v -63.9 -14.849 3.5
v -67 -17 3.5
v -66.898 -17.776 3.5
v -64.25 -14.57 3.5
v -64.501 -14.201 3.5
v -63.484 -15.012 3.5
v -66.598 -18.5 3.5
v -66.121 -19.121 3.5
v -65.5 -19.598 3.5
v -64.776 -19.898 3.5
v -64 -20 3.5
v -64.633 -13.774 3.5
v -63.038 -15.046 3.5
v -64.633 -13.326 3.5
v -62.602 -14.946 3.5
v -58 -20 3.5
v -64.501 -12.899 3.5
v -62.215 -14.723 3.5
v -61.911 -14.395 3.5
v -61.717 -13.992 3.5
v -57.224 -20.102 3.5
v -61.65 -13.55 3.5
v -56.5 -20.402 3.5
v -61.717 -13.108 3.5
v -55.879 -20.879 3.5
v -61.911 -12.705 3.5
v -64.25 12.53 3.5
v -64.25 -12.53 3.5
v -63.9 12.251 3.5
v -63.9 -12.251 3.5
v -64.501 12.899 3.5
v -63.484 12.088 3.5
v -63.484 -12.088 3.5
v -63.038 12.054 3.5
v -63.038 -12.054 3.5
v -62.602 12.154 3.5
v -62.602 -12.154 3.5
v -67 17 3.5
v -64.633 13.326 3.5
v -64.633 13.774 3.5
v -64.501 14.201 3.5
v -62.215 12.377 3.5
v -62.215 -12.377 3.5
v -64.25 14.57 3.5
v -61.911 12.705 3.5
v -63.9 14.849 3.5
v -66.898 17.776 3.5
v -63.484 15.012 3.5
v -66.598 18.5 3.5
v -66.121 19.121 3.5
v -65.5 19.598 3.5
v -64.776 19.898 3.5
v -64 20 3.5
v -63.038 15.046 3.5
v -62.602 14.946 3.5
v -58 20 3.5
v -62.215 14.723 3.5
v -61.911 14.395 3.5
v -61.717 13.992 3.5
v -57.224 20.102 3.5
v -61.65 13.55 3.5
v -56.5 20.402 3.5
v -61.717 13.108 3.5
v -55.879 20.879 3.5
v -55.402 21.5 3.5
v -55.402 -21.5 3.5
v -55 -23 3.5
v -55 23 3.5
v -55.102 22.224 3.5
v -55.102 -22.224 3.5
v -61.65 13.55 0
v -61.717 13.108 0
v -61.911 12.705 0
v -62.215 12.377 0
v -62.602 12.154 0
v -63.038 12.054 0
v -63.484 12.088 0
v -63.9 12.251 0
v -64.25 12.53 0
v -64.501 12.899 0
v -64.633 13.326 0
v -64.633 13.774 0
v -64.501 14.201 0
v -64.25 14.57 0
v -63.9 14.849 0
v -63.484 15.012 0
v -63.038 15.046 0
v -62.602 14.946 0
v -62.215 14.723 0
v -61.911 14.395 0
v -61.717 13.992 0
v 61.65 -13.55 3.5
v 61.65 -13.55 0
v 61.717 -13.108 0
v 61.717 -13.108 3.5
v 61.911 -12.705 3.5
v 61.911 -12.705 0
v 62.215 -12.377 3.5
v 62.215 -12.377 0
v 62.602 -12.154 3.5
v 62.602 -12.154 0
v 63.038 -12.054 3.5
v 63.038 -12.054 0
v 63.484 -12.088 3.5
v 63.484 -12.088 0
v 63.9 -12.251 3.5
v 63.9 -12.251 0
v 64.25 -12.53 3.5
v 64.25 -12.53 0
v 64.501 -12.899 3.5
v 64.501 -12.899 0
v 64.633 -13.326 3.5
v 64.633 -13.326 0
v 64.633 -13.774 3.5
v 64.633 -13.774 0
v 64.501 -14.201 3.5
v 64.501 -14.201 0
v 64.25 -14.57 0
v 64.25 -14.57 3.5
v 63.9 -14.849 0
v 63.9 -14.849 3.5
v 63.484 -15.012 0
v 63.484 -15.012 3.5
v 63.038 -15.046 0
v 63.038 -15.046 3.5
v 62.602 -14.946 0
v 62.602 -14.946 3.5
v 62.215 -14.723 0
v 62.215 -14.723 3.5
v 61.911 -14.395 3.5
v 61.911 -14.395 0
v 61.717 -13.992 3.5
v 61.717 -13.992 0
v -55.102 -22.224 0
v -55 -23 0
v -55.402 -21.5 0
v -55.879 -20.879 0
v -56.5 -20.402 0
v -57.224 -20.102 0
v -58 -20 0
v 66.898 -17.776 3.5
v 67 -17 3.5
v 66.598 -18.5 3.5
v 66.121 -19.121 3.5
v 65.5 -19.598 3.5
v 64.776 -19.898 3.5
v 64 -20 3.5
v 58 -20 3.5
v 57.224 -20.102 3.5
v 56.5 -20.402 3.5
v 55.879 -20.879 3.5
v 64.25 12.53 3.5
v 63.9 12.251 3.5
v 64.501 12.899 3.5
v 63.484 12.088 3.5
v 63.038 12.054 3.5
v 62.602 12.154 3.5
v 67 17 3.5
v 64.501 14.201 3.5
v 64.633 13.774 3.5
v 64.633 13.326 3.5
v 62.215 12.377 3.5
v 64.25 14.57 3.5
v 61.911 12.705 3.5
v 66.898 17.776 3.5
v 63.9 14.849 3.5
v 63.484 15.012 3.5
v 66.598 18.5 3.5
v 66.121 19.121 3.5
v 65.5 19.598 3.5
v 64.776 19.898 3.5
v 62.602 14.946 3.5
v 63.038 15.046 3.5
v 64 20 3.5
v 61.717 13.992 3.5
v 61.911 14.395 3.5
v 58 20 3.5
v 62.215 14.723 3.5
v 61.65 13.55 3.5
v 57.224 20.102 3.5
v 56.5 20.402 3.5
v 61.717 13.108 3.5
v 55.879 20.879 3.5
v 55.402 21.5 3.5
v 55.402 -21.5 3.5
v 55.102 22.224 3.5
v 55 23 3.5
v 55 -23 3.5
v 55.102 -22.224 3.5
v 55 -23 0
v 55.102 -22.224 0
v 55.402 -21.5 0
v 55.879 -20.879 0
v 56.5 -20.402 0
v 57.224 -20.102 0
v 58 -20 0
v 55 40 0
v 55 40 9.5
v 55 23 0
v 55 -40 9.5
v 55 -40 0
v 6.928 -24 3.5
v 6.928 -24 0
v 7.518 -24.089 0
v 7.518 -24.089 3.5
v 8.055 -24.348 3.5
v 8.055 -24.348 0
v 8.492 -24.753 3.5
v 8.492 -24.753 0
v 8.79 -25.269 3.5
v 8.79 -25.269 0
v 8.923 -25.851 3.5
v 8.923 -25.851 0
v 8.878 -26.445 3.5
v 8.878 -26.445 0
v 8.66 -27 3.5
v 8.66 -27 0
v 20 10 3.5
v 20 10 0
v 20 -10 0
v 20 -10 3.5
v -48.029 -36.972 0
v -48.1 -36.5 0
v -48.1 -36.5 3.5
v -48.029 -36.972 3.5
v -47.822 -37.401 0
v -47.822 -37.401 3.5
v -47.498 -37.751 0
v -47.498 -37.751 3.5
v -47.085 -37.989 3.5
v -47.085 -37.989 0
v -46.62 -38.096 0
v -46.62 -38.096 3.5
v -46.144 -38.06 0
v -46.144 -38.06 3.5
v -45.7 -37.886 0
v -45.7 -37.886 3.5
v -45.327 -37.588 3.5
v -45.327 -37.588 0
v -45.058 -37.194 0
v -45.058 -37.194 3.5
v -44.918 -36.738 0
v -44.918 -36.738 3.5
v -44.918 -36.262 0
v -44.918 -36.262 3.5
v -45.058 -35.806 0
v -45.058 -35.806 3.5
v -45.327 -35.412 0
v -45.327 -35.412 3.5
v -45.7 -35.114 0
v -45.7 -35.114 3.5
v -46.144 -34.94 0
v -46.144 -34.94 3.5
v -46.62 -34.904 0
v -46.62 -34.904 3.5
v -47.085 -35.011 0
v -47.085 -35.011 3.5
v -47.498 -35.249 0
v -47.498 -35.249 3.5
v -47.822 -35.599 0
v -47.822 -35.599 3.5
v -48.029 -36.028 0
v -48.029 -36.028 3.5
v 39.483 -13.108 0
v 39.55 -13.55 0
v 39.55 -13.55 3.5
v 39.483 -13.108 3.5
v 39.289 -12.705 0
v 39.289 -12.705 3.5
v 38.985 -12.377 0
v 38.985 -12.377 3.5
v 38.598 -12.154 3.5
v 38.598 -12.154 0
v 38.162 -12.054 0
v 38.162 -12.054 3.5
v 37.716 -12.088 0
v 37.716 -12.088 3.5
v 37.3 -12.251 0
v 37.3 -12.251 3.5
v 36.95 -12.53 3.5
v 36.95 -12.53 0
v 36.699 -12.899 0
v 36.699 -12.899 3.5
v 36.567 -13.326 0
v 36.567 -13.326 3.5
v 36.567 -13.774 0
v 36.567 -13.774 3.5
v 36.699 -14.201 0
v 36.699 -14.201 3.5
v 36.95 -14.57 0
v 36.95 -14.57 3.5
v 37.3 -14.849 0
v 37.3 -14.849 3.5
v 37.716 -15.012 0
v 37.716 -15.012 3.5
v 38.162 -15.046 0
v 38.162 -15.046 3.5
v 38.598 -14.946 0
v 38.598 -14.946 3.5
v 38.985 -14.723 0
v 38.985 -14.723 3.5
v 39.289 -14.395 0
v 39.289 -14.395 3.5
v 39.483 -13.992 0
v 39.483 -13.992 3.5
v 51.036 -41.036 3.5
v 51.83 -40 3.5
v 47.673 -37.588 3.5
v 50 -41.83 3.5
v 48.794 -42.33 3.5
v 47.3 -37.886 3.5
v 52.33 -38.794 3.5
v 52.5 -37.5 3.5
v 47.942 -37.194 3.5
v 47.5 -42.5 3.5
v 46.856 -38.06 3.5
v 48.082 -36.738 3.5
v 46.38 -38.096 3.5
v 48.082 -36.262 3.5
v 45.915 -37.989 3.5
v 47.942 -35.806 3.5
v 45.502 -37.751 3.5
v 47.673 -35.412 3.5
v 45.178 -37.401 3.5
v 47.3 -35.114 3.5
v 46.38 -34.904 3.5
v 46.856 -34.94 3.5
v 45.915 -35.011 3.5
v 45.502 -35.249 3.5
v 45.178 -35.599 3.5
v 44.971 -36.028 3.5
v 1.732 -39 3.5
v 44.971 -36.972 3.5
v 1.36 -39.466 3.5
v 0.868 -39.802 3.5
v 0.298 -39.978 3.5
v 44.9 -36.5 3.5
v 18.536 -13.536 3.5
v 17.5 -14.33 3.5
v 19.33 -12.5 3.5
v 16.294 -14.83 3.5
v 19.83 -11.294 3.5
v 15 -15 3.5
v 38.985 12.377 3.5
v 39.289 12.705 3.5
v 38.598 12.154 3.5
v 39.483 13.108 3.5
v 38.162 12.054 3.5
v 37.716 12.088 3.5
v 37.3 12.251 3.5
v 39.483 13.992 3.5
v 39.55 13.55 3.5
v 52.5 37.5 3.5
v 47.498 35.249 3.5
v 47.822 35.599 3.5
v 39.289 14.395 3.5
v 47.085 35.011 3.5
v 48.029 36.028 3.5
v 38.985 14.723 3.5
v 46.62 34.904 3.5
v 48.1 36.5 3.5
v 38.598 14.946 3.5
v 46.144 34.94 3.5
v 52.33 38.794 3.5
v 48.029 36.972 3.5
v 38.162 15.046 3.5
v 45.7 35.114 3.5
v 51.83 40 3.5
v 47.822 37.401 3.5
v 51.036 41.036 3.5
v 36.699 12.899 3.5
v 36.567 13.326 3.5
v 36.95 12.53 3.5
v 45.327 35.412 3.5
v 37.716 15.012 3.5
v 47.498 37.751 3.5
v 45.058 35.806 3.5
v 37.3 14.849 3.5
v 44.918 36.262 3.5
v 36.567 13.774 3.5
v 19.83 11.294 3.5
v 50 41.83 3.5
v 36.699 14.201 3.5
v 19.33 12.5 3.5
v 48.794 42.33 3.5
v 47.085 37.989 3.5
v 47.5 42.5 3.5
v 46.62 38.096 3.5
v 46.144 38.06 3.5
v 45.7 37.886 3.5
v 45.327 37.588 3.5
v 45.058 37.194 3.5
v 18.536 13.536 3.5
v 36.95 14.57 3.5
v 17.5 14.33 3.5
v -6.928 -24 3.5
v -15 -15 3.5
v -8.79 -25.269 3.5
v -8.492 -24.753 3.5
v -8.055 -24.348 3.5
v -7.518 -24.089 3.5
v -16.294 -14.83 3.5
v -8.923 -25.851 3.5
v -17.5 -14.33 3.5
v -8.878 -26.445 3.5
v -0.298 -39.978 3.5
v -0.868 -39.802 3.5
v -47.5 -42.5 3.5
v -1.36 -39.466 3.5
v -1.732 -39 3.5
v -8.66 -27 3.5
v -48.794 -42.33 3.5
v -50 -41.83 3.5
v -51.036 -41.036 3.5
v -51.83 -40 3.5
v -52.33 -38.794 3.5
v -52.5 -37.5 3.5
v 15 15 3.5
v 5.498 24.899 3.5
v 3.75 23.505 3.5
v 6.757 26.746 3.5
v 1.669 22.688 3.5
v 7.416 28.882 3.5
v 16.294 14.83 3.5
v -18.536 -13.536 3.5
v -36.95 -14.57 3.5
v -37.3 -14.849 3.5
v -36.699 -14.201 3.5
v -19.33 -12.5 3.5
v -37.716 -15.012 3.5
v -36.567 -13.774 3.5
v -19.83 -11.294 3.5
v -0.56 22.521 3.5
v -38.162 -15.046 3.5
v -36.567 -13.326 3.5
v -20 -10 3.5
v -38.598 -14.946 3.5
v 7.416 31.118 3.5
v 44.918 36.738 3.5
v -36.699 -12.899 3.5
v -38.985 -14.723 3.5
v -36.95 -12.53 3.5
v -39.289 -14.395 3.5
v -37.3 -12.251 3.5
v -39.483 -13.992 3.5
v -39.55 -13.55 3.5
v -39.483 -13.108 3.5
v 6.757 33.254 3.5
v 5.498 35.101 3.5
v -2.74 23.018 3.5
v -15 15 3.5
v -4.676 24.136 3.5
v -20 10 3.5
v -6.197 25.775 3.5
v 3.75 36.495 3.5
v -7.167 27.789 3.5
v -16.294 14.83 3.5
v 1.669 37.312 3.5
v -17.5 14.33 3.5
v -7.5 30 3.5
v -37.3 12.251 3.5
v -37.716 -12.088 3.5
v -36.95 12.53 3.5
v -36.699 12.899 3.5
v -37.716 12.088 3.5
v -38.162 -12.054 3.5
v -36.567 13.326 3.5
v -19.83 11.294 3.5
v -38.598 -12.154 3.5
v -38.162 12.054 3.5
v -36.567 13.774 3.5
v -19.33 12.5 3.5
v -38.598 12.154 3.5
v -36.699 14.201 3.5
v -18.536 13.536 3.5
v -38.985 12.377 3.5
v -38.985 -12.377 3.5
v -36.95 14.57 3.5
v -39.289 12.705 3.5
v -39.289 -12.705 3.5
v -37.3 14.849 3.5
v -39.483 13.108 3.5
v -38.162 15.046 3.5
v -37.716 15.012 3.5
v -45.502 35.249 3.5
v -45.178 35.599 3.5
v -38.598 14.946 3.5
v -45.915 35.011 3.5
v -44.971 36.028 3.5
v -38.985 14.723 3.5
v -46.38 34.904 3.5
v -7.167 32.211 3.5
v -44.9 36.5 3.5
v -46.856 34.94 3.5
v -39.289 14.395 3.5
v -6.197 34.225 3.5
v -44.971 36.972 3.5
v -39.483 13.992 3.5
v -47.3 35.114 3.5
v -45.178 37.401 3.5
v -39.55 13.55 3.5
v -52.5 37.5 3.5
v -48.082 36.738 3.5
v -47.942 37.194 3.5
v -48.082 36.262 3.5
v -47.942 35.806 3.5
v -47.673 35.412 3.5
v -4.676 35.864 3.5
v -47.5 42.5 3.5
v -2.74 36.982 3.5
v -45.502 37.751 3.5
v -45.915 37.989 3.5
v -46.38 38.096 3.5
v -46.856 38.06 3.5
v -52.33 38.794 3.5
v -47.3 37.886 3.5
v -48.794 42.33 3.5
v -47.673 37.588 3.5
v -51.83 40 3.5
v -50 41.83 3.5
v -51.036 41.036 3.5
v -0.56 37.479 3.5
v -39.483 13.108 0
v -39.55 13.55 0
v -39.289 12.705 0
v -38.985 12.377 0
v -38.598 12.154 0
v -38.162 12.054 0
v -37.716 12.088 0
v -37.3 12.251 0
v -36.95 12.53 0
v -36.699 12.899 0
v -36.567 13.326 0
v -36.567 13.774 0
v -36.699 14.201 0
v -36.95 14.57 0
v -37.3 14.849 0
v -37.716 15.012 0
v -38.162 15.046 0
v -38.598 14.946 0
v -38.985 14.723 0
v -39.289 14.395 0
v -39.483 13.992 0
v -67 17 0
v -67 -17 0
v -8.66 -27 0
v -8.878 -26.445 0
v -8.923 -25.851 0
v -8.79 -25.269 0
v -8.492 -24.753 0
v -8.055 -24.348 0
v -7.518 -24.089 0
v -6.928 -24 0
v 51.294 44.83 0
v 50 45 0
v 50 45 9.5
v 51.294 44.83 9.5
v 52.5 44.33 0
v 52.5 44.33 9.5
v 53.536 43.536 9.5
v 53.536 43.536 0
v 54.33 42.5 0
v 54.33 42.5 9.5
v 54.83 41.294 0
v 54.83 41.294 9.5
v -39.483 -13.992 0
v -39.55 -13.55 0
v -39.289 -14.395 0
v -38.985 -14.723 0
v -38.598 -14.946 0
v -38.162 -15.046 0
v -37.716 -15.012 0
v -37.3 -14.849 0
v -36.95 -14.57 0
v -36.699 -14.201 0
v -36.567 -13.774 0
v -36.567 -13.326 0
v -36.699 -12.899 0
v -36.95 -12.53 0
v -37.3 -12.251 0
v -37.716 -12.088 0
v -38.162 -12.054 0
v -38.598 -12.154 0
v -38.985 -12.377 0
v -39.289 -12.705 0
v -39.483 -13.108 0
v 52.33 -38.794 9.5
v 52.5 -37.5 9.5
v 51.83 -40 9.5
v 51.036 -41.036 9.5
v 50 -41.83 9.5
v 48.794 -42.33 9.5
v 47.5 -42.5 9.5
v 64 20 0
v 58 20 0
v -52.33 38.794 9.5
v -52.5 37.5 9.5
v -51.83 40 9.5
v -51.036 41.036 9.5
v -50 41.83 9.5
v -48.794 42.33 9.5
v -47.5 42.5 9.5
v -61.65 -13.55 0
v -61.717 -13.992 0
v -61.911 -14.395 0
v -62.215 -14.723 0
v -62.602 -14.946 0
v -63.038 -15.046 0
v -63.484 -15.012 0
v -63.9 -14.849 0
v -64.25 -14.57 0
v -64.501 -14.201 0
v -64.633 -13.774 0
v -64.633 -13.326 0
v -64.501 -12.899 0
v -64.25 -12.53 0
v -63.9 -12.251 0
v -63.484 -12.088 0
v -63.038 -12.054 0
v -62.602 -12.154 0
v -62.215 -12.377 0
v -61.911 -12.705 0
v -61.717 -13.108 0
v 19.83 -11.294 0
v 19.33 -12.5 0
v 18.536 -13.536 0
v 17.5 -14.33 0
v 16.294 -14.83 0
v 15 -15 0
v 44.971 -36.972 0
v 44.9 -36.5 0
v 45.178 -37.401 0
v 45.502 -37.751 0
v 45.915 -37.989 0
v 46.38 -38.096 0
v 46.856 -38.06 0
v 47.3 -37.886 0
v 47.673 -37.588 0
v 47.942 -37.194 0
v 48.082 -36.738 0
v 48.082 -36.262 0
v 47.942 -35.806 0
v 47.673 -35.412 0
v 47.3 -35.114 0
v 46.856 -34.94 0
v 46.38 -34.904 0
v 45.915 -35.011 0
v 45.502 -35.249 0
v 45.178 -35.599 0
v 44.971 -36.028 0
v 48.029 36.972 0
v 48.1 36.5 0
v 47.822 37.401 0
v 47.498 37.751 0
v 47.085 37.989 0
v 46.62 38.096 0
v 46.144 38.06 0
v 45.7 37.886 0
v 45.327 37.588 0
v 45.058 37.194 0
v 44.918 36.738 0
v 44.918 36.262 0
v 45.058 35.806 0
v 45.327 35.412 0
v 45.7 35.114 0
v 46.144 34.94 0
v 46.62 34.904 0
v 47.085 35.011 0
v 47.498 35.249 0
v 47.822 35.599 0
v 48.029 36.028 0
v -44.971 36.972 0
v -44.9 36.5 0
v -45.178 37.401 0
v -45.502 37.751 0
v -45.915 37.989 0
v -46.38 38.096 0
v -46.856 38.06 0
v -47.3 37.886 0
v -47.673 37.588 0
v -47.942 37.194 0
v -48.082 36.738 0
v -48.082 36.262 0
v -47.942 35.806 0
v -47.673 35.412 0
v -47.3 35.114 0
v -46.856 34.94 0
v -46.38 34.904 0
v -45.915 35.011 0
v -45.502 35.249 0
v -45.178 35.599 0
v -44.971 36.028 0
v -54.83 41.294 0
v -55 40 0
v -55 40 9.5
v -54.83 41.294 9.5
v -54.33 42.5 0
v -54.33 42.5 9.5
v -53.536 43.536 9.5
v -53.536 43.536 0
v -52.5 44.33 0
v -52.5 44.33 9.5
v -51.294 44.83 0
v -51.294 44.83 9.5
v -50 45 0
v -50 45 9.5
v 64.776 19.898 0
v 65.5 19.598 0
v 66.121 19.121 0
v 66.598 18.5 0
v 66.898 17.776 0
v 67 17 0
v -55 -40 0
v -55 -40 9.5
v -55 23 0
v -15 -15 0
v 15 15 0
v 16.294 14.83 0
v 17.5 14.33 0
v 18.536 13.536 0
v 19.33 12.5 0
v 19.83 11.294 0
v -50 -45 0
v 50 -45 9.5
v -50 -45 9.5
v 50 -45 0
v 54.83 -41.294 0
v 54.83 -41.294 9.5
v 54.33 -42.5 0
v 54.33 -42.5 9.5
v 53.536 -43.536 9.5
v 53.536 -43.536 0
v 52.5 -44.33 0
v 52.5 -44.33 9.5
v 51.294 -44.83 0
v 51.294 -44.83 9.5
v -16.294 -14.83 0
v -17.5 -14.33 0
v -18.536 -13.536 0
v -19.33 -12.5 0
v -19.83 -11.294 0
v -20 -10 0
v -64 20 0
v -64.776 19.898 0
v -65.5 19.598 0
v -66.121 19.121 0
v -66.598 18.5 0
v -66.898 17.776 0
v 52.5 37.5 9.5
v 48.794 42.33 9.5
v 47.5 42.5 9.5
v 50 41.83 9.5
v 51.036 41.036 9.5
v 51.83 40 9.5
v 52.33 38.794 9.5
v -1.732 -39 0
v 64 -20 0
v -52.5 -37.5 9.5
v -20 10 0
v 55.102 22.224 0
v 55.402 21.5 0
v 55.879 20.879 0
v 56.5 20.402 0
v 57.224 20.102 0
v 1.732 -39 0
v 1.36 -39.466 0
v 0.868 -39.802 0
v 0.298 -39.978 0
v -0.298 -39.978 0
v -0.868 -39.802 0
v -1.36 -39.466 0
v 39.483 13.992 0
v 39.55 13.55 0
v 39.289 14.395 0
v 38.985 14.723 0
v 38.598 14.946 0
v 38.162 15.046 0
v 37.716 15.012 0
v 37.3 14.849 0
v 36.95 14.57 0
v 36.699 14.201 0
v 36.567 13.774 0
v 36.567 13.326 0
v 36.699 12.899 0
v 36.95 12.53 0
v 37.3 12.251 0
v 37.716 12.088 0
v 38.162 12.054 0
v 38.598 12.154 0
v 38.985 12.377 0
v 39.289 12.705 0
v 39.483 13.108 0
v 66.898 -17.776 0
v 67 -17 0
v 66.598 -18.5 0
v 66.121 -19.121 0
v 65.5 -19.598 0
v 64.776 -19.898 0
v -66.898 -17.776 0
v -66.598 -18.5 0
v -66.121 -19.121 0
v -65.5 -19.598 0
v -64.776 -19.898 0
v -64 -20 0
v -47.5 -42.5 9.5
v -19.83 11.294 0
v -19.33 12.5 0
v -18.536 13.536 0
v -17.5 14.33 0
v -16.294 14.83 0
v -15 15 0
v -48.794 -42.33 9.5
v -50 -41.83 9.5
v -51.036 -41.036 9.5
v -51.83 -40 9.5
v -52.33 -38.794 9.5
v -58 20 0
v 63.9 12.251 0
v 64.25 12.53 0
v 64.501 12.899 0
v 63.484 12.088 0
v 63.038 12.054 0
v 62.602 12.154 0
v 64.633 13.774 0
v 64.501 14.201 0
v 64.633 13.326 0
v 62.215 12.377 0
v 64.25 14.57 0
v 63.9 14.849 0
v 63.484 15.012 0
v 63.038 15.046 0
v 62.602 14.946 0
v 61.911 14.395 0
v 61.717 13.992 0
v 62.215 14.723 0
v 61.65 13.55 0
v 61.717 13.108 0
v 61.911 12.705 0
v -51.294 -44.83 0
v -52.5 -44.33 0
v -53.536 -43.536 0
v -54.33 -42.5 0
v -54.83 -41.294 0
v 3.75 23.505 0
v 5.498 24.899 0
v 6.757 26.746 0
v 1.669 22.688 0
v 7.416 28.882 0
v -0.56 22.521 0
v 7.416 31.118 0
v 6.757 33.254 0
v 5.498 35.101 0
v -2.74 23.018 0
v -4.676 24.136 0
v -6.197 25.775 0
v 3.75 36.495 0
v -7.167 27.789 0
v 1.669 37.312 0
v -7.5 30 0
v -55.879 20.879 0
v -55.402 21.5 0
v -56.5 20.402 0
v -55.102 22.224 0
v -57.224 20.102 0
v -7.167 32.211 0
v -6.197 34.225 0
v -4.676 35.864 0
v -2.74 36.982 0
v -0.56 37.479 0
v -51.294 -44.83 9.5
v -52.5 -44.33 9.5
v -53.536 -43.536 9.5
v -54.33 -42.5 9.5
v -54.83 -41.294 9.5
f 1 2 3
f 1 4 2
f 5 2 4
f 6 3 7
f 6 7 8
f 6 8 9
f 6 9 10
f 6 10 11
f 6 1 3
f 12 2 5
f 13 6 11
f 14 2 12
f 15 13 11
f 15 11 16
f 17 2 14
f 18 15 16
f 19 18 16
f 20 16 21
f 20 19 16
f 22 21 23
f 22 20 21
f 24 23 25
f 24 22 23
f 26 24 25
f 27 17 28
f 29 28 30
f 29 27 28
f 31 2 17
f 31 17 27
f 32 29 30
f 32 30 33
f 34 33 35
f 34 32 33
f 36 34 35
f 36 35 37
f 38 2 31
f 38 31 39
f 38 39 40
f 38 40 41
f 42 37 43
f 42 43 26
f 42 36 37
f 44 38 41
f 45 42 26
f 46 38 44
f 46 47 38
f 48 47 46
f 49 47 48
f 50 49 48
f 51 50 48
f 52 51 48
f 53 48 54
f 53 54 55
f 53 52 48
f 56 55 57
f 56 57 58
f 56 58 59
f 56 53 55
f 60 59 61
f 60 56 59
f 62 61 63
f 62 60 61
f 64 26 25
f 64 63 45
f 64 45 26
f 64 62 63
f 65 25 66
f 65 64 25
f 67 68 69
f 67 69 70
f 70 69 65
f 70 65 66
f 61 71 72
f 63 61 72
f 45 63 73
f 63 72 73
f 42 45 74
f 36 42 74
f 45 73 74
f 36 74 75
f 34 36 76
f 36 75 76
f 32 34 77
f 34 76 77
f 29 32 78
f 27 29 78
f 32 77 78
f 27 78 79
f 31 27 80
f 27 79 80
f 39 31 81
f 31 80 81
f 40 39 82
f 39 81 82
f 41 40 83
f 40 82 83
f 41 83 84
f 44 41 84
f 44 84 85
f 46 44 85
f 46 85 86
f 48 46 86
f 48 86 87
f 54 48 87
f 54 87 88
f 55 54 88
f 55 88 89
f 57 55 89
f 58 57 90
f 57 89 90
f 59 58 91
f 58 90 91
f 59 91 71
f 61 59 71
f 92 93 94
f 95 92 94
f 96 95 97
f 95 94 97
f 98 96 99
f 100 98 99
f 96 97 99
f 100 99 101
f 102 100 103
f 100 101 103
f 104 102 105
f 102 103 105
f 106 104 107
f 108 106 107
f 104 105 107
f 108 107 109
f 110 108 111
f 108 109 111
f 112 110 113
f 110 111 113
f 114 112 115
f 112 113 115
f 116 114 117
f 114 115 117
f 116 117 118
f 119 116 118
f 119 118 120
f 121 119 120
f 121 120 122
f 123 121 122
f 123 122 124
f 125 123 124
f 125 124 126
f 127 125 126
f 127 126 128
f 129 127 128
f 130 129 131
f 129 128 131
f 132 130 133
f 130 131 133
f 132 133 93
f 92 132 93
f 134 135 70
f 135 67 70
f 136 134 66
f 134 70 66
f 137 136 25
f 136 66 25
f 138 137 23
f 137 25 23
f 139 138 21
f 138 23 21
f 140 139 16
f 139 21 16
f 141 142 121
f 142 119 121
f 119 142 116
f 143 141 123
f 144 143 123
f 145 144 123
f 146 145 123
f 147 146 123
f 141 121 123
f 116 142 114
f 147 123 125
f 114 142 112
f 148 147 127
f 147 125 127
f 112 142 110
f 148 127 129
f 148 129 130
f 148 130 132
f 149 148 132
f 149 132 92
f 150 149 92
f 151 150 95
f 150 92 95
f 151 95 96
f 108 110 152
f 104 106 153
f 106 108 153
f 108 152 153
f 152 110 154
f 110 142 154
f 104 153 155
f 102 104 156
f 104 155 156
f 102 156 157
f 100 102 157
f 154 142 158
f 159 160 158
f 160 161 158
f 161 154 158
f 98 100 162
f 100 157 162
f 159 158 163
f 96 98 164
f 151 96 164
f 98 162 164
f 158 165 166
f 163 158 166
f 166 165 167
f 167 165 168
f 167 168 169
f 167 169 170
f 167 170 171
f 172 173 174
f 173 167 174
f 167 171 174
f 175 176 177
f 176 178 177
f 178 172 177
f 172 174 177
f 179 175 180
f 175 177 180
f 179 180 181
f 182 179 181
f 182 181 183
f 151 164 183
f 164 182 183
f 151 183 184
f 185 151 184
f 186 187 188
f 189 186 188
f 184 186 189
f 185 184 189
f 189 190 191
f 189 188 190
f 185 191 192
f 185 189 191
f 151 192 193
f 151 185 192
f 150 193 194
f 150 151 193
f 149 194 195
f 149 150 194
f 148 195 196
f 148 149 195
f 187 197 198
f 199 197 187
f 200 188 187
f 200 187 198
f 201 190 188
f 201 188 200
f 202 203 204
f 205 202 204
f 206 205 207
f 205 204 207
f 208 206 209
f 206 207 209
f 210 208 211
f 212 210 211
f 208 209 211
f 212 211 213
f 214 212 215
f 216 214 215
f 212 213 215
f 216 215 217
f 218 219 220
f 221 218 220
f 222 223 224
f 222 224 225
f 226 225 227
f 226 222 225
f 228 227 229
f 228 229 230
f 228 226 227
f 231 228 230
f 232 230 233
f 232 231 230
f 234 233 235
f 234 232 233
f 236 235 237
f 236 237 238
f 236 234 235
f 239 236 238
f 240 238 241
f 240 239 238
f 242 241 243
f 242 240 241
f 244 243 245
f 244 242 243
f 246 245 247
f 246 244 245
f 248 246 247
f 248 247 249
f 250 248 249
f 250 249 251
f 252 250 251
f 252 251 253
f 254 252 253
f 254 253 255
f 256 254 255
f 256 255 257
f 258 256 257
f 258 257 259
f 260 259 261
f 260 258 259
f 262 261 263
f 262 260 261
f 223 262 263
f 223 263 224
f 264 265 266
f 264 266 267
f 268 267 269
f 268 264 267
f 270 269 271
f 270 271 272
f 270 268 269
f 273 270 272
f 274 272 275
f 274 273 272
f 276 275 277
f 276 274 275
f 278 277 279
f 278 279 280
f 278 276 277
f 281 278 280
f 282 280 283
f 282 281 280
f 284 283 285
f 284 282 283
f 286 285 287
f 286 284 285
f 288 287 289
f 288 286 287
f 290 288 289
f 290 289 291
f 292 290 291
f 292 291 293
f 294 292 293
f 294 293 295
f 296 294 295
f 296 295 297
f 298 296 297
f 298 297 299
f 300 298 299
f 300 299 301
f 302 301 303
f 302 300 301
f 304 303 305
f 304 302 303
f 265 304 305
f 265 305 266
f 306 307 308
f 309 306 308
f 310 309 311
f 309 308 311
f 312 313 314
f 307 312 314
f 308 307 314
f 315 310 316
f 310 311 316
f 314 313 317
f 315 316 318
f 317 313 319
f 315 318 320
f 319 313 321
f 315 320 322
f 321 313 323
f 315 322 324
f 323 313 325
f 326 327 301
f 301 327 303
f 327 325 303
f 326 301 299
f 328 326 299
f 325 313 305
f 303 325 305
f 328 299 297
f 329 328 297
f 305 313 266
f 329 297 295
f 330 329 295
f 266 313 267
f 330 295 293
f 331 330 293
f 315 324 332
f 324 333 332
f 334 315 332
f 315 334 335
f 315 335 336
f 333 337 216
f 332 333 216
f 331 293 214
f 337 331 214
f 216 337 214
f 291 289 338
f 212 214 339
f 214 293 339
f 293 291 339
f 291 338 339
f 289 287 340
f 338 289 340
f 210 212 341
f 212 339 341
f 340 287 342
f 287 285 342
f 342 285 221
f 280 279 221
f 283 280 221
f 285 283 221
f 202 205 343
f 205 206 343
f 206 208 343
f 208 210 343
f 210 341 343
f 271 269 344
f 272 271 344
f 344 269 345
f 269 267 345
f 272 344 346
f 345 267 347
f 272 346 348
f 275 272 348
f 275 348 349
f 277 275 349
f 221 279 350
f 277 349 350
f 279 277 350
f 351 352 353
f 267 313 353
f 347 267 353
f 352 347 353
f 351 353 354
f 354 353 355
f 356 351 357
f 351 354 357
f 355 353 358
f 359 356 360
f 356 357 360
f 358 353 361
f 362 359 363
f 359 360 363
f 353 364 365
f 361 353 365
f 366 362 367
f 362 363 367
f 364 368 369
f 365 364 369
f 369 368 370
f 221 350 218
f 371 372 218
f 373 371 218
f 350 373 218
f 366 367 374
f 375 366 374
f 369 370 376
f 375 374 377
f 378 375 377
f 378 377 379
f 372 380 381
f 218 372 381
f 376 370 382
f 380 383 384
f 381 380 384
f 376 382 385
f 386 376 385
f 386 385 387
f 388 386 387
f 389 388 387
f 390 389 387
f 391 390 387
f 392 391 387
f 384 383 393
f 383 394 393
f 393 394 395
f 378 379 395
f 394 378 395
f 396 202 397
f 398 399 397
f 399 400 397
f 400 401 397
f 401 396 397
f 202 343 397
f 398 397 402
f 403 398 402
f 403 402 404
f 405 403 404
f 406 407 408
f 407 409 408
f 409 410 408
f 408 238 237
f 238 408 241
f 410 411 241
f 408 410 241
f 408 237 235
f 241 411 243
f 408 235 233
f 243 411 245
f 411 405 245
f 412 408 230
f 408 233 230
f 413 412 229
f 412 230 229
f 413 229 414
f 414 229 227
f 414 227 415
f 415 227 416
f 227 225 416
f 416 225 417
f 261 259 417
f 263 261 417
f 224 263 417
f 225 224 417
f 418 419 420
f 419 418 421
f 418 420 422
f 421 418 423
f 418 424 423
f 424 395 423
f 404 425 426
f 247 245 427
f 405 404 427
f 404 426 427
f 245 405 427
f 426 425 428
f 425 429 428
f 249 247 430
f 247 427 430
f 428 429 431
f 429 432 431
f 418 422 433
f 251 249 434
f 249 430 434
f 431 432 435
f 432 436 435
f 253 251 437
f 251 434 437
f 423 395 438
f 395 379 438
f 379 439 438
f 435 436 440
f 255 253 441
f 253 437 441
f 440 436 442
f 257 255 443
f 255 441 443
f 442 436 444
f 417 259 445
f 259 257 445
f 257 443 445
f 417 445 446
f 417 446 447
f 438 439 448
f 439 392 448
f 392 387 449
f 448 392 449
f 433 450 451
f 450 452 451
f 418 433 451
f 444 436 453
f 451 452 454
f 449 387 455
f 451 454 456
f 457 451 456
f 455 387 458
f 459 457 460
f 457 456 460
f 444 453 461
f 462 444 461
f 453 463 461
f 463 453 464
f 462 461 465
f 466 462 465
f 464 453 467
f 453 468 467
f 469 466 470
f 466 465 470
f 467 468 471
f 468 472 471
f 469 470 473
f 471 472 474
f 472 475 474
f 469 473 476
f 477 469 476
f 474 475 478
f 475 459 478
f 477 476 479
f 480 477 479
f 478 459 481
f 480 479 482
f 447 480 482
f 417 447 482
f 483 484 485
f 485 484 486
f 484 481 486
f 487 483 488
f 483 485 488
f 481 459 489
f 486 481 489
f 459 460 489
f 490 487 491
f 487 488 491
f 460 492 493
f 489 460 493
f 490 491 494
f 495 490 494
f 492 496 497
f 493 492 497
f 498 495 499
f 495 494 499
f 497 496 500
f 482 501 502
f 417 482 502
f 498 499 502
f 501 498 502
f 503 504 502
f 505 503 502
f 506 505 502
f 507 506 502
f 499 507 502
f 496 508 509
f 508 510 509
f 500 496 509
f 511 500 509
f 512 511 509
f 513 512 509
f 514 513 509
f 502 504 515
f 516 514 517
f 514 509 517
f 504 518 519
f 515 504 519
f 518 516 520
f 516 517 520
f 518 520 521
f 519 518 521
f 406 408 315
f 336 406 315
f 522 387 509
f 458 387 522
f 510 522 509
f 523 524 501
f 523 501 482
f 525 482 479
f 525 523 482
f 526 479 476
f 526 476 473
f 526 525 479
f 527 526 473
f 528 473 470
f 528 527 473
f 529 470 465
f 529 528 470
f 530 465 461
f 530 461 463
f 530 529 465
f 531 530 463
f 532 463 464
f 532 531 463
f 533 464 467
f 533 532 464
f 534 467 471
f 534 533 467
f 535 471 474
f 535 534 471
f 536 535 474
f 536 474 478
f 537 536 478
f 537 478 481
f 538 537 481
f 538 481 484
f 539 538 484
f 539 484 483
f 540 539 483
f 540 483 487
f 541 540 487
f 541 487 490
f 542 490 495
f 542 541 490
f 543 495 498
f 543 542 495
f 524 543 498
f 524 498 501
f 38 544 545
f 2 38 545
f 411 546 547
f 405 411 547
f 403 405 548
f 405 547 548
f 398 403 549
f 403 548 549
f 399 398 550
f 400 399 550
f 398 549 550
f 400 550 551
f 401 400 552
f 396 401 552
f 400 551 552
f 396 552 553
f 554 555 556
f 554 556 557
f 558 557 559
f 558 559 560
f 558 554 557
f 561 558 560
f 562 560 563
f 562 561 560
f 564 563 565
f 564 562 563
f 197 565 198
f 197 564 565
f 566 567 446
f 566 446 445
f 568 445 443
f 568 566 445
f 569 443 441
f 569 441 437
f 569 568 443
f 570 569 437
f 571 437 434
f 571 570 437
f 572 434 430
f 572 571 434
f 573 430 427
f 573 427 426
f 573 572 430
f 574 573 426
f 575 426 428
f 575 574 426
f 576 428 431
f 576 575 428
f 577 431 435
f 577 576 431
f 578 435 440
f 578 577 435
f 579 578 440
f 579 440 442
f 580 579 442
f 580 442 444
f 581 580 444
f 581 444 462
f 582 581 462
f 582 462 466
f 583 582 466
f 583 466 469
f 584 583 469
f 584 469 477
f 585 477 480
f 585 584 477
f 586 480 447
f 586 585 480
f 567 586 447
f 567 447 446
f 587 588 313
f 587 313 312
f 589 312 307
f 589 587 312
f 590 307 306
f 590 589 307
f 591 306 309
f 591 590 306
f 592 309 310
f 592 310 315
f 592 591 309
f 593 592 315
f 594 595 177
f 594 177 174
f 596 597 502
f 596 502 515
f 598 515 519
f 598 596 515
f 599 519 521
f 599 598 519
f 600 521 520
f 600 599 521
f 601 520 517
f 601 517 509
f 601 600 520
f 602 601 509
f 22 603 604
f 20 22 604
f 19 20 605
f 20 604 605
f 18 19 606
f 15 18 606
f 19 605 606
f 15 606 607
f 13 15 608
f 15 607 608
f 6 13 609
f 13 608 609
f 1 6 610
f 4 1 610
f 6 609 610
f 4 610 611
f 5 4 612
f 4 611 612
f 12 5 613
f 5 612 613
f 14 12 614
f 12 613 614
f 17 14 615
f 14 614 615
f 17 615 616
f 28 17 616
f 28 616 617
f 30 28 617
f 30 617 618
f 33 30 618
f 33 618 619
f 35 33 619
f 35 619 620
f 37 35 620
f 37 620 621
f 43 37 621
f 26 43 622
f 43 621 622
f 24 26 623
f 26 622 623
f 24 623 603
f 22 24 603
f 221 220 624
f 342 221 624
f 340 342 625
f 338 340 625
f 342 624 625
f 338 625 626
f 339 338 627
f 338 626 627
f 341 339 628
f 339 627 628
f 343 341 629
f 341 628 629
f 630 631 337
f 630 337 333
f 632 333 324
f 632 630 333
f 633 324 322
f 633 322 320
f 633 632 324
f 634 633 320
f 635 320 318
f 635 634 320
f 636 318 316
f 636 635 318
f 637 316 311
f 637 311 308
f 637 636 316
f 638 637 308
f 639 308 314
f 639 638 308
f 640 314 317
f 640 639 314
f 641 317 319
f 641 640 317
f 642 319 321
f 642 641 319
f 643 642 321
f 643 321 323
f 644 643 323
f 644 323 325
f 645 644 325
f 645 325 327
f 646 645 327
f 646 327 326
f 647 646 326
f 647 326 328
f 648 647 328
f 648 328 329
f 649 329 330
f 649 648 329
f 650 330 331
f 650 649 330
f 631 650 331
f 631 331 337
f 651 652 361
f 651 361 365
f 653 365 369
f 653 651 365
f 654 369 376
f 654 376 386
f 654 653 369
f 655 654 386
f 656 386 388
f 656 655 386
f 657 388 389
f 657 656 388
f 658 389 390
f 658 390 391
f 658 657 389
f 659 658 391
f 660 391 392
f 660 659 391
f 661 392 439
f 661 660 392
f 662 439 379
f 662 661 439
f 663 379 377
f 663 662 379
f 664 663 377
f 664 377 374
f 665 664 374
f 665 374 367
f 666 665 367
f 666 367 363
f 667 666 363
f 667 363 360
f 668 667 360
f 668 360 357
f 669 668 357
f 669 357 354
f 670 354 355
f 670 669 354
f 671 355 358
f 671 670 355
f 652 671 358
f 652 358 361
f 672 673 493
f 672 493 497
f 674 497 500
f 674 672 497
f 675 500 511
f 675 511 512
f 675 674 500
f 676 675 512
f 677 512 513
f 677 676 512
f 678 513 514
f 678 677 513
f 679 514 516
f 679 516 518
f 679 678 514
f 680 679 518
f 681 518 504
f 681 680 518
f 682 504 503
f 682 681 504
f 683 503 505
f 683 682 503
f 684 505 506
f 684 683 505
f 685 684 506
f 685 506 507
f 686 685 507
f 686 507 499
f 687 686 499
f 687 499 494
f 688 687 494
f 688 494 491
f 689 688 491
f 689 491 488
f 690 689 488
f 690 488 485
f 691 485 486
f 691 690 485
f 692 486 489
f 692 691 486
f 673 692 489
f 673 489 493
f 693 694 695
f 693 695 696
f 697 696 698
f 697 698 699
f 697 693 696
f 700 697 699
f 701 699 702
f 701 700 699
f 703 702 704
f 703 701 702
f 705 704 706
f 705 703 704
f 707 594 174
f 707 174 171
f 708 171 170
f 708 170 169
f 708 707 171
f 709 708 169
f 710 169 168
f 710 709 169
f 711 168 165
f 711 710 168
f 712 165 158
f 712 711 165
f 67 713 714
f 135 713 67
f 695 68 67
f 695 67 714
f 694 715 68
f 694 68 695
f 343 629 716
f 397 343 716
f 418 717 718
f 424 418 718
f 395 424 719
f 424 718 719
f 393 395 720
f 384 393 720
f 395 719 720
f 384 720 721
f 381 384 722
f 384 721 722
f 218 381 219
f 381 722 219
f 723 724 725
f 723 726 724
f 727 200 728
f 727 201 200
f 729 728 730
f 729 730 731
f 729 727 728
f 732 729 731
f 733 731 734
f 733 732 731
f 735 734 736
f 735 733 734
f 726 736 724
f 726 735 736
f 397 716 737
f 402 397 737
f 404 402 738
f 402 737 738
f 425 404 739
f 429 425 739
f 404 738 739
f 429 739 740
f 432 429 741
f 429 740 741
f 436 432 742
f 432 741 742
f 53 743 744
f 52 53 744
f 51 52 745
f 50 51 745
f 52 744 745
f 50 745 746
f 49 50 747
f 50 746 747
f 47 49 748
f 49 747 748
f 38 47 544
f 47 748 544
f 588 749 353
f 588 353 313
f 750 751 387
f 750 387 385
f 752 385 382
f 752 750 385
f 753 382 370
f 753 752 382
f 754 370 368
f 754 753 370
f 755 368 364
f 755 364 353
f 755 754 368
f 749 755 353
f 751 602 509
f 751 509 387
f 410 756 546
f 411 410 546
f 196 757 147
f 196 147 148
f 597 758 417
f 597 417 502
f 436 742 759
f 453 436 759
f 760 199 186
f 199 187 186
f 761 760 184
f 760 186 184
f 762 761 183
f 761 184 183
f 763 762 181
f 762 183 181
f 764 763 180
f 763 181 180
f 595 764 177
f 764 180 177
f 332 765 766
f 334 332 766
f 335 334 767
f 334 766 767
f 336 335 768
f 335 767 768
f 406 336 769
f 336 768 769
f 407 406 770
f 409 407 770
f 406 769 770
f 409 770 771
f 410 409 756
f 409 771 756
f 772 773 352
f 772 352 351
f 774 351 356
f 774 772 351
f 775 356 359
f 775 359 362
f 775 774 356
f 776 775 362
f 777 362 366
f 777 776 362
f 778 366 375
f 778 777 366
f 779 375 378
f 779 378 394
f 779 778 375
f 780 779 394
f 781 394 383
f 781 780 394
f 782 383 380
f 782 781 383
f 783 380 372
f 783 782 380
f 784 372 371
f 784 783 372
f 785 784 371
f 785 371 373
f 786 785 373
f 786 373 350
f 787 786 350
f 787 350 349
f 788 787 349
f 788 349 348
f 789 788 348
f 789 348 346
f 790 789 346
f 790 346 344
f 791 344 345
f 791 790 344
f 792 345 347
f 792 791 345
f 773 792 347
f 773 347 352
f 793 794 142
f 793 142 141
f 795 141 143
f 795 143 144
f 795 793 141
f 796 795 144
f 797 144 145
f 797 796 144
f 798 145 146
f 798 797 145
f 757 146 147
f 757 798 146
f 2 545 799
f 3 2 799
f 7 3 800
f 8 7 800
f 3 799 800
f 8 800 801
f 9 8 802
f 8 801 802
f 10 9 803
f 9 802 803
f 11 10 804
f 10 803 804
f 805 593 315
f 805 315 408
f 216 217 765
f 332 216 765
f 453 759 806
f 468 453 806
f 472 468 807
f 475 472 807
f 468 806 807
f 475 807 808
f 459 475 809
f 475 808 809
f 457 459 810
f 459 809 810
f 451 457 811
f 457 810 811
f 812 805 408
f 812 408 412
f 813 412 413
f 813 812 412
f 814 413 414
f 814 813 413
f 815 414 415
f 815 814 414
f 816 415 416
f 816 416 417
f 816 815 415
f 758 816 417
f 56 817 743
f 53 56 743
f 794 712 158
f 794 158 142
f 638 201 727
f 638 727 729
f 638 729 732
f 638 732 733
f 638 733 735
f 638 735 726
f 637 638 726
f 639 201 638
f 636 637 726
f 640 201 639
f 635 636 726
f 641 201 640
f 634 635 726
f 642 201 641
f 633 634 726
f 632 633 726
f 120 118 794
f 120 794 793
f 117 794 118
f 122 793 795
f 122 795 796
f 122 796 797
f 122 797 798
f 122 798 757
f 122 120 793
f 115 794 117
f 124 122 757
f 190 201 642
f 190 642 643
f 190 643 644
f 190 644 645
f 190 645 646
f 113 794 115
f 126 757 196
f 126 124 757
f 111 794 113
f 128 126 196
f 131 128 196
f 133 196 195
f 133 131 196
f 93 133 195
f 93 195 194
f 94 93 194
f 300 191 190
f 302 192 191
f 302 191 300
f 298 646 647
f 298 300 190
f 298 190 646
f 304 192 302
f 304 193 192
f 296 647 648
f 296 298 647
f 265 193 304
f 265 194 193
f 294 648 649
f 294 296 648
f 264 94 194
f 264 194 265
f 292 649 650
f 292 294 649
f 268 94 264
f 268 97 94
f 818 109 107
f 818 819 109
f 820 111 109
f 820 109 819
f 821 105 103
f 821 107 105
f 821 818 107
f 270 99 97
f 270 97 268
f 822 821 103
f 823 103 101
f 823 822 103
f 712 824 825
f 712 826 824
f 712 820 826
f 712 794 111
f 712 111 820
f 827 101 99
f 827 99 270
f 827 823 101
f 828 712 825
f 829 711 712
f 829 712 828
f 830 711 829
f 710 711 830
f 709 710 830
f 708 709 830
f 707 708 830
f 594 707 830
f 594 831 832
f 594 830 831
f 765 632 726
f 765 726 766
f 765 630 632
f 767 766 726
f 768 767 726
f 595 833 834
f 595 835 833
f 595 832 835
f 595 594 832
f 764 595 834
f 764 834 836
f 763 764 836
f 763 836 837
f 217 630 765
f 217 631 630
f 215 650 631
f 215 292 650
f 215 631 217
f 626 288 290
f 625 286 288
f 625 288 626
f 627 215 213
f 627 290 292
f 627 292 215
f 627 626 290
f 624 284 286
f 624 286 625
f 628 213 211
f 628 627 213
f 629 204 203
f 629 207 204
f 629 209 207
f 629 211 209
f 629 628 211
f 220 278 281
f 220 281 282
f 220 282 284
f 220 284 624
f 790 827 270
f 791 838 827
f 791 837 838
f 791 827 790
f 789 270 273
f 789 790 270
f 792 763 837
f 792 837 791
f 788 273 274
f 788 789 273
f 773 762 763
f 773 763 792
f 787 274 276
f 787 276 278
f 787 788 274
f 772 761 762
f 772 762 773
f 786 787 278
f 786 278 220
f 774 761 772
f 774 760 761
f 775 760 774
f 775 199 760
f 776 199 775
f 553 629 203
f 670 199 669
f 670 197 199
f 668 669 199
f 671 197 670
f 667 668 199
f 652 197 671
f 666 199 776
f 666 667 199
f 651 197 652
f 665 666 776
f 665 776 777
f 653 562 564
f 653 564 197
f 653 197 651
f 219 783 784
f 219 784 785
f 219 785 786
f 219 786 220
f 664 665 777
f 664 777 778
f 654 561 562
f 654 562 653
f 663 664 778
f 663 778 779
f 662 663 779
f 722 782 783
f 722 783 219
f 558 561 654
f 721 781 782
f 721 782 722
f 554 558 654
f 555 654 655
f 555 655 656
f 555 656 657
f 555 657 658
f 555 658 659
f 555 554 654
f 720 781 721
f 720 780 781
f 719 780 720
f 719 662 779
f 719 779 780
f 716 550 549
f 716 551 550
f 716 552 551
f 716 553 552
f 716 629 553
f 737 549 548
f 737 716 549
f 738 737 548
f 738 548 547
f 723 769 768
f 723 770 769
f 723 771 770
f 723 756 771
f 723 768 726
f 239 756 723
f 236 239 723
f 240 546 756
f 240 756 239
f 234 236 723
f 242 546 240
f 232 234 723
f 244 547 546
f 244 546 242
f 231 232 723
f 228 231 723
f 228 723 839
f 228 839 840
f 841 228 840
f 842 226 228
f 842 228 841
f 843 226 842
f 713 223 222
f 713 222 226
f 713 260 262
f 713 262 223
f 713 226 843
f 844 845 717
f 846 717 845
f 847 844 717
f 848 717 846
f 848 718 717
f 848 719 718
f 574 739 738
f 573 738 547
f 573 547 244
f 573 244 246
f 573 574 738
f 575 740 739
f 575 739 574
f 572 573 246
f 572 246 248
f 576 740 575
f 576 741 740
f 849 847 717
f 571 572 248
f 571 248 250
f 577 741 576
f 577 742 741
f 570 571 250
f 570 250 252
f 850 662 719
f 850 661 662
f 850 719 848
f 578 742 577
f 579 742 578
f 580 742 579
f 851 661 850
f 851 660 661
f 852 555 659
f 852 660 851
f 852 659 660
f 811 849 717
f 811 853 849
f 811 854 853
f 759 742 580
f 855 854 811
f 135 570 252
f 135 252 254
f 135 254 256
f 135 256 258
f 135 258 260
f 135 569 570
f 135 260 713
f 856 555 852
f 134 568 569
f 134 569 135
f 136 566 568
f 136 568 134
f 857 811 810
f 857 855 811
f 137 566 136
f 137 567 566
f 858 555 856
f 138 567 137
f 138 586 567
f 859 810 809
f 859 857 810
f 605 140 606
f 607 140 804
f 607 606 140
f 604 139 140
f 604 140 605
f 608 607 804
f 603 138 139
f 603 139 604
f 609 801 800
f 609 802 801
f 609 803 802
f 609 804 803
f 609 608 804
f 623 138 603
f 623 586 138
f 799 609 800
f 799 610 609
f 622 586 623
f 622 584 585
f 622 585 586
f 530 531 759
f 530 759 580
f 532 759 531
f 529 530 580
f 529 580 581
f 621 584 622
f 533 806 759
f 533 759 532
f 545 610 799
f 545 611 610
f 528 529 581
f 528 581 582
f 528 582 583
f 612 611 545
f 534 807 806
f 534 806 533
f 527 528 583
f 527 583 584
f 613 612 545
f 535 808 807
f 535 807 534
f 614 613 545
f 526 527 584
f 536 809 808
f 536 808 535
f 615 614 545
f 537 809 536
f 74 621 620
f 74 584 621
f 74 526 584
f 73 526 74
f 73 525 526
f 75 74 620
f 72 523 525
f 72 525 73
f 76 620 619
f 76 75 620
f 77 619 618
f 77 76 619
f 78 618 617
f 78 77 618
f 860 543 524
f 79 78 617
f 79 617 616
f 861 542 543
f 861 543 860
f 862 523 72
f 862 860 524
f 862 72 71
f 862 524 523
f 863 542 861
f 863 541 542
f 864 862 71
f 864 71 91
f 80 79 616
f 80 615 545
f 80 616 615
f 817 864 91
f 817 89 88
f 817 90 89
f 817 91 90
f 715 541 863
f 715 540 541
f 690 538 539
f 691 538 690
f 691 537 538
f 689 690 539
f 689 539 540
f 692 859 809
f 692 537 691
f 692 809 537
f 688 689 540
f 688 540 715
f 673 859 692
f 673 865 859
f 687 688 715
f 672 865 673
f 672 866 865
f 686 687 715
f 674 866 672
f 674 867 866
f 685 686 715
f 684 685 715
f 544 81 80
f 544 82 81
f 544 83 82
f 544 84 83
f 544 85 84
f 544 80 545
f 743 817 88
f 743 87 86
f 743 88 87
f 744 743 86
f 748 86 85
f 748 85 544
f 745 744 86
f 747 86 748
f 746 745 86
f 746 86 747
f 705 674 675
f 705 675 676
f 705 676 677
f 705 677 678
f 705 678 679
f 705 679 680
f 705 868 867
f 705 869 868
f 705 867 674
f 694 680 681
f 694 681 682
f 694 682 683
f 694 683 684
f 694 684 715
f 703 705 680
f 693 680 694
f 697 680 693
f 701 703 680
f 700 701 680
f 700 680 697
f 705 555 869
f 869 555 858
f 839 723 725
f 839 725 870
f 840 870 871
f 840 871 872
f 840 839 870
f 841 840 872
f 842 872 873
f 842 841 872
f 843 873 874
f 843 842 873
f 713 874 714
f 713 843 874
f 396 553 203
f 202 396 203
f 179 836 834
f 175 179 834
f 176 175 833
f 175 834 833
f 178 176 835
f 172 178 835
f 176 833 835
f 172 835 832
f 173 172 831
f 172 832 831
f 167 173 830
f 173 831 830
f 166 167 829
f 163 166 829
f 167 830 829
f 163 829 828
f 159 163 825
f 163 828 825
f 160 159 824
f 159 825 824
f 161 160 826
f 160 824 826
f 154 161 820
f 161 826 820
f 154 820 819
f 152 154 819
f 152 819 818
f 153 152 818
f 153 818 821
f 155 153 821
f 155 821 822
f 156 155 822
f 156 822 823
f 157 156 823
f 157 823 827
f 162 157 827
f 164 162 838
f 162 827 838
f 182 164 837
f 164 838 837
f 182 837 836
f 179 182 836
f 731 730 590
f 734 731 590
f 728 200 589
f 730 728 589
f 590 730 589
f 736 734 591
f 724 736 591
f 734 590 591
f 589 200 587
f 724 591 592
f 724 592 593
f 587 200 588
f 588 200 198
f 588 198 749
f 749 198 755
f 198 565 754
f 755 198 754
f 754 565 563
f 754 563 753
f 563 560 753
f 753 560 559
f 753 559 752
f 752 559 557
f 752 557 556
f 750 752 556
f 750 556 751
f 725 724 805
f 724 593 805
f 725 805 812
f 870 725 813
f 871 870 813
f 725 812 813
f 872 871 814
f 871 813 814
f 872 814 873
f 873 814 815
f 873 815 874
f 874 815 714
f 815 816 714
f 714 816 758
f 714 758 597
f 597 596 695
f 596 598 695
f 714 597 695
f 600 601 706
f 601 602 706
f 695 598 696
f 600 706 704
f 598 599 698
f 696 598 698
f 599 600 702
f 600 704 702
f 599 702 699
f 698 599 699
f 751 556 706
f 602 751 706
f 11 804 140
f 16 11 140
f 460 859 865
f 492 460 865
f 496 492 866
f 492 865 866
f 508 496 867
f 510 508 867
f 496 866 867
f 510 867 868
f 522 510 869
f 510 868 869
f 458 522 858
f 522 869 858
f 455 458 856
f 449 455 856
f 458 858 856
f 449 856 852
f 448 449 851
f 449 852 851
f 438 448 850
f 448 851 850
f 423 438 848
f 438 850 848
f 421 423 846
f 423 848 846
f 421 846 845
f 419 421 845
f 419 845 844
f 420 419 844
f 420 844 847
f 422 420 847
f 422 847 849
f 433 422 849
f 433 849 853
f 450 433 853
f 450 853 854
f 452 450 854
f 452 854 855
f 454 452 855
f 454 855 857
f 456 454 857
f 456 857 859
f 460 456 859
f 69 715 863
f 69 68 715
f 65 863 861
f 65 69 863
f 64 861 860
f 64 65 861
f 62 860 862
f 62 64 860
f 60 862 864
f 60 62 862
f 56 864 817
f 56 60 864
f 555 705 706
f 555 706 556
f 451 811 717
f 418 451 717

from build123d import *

# Parameters (mm, degrees)
SKETCH1_R           = 1.6
SKETCH1_R_2         = 1.5
BOSS_EXTRUDE1_DEPTH = 3.5
SKETCH2_R           = 7.5
CUT_EXTRUDE1_DEPTH  = 10
BOSS_EXTRUDE2_DEPTH = 6
CUT_EXTRUDE2_DEPTH  = 6
SKETCH5_R           = 1.5
BOSS_EXTRUDE3_DEPTH = 3.5
FILLET1_R           = 3


with BuildPart() as part:
    # Sketch1 → Boss-Extrude1 (new body)
    with BuildSketch(Plane.XY):
        with BuildLine():
            Line((50, -45), (-50, -45))
            ThreePointArc((-50, -45), (-53.535533906, -43.535533906), (-55, -40))
            Line((-55, -40), (-55, 40))
            ThreePointArc((-55, 40), (-53.535533906, 43.535533906), (-50, 45))
            Line((-50, 45), (50, 45))
            ThreePointArc((50, 45), (53.535533906, 43.535533906), (55, 40))
            Line((55, 40), (55, -40))
            ThreePointArc((55, -40), (53.535533906, -43.535533906), (50, -45))
        make_face()
        with Locations((-46.5, 36.5)):
            Circle(SKETCH1_R, mode=Mode.SUBTRACT)
        with Locations((46.5, 36.5)):
            Circle(SKETCH1_R, mode=Mode.SUBTRACT)
        with Locations(Location((46.5, -36.5, 0), (0, 0, 180))):
            Circle(SKETCH1_R, mode=Mode.SUBTRACT)
        with Locations(Location((-46.5, -36.5, 0), (0, 0, 180))):
            Circle(SKETCH1_R, mode=Mode.SUBTRACT)
        with Locations((38.05, 13.55)):
            Circle(SKETCH1_R_2, mode=Mode.SUBTRACT)
        with Locations((38.05, -13.55)):
            Circle(SKETCH1_R_2, mode=Mode.SUBTRACT)
        with Locations(Location((-38.05, -13.55, 0), (0, 0, 180))):
            Circle(SKETCH1_R_2, mode=Mode.SUBTRACT)
        with Locations(Location((-38.05, 13.55, 0), (0, 0, 180))):
            Circle(SKETCH1_R_2, mode=Mode.SUBTRACT)
    extrude(amount=BOSS_EXTRUDE1_DEPTH)

    # Sketch2 → Cut-Extrude1 (cut)
    with BuildSketch(Plane(origin=(0, 0, 0), x_dir=(-1, 0, 0), z_dir=(0, 0, -1))):
        with Locations((0, 30)):
            Circle(SKETCH2_R)
        with BuildLine():
            Line((-15, -15), (15, -15))
            ThreePointArc((15, -15), (18.535533906, -13.535533906), (20, -10))
            Line((20, -10), (20, 10))
            ThreePointArc((20, 10), (18.535533906, 13.535533906), (15, 15))
            Line((15, 15), (-15, 15))
            ThreePointArc((-15, 15), (-18.535533906, 13.535533906), (-20, 10))
            Line((-20, 10), (-20, -10))
            ThreePointArc((-20, -10), (-18.535533906, -13.535533906), (-15, -15))
        make_face()
        with BuildLine():
            Line((1.732050808, -39), (8.660254038, -27))
            ThreePointArc((8.660254038, -27), (8.660254038, -25), (6.92820323, -24))
            Line((6.92820323, -24), (-6.92820323, -24))
            ThreePointArc((-6.92820323, -24), (-8.660254038, -25), (-8.660254038, -27))
            Line((-8.660254038, -27), (-1.732050808, -39))
            ThreePointArc((-1.732050808, -39), (0, -40), (1.732050808, -39))
        make_face()
    extrude(amount=-CUT_EXTRUDE1_DEPTH, mode=Mode.SUBTRACT)

    # Sketch3 → Boss-Extrude2 (add)
    with BuildSketch(Plane.XY.offset(3.5)):
        with BuildLine():
            Line((50, -45), (-50, -45))
            ThreePointArc((-50, -45), (-53.535533906, -43.535533906), (-55, -40))
            Line((-55, -40), (-55, 40))
            ThreePointArc((-55, 40), (-53.535533906, 43.535533906), (-50, 45))
            Line((-50, 45), (50, 45))
            ThreePointArc((50, 45), (53.535533906, 43.535533906), (55, 40))
            Line((55, 40), (55, -40))
            ThreePointArc((55, -40), (53.535533906, -43.535533906), (50, -45))
        make_face()
    extrude(amount=BOSS_EXTRUDE2_DEPTH)

    # Sketch4 → Cut-Extrude2 (cut)
    with BuildSketch(Plane.XY.offset(9.5)):
        with BuildLine():
            Line((47.5, -42.5), (-47.5, -42.5))
            ThreePointArc((-47.5, -42.5), (-51.035533906, -41.035533906), (-52.5, -37.5))
            Line((-52.5, -37.5), (-52.5, 37.5))
            ThreePointArc((-52.5, 37.5), (-51.035533906, 41.035533906), (-47.5, 42.5))
            Line((-47.5, 42.5), (47.5, 42.5))
            ThreePointArc((47.5, 42.5), (51.035533906, 41.035533906), (52.5, 37.5))
            Line((52.5, 37.5), (52.5, -37.5))
            ThreePointArc((52.5, -37.5), (51.035533906, -41.035533906), (47.5, -42.5))
        make_face()
    extrude(amount=-CUT_EXTRUDE2_DEPTH, mode=Mode.SUBTRACT)

    # Sketch5 → Boss-Extrude3 (add)
    # profile 1 of 2: a face of its own
    with BuildSketch(Plane(origin=(0, 0, 0), x_dir=(-1, 0, 0), z_dir=(0, 0, -1))):
        with BuildLine():
            Line((-55, 20), (-64, 20))
            ThreePointArc((-64, 20), (-66.121320344, 19.121320344), (-67, 17))
            Line((-67, 17), (-67, -17))
            ThreePointArc((-67, -17), (-66.121320344, -19.121320344), (-64, -20))
            Line((-64, -20), (-55, -20))
            Line((-55, -20), (-55, 20))
        make_face()
        with Locations((-63.15, 13.55)):
            Circle(SKETCH5_R, mode=Mode.SUBTRACT)
        with Locations((-63.15, -13.55)):
            Circle(SKETCH5_R, mode=Mode.SUBTRACT)
    # profile 2 of 2: a face of its own
    with BuildSketch(Plane(origin=(0, 0, 0), x_dir=(-1, 0, 0), z_dir=(0, 0, -1))):
        with BuildLine():
            Line((64, -20), (55, -20))
            Line((55, -20), (55, 20))
            Line((55, 20), (64, 20))
            ThreePointArc((64, 20), (66.121320344, 19.121320344), (67, 17))
            Line((67, 17), (67, -17))
            ThreePointArc((67, -17), (66.121320344, -19.121320344), (64, -20))
        make_face()
        with Locations(Location((63.15, -13.55, 0), (0, 0, 180))):
            Circle(SKETCH5_R, mode=Mode.SUBTRACT)
        with Locations(Location((63.15, 13.55, 0), (0, 0, 180))):
            Circle(SKETCH5_R, mode=Mode.SUBTRACT)
    extrude(amount=-BOSS_EXTRUDE3_DEPTH)

    # Fillet1
    fillet1_edges = [part.edges().sort_by_distance(p)[0] for p in [
        (55, 20, 1.75),
        (55, -20, 1.75),
        (-55, -20, 1.75),
        (-55, 20, 1.75),
    ]]
    fillet(fillet1_edges, radius=FILLET1_R)


solid = part.part
